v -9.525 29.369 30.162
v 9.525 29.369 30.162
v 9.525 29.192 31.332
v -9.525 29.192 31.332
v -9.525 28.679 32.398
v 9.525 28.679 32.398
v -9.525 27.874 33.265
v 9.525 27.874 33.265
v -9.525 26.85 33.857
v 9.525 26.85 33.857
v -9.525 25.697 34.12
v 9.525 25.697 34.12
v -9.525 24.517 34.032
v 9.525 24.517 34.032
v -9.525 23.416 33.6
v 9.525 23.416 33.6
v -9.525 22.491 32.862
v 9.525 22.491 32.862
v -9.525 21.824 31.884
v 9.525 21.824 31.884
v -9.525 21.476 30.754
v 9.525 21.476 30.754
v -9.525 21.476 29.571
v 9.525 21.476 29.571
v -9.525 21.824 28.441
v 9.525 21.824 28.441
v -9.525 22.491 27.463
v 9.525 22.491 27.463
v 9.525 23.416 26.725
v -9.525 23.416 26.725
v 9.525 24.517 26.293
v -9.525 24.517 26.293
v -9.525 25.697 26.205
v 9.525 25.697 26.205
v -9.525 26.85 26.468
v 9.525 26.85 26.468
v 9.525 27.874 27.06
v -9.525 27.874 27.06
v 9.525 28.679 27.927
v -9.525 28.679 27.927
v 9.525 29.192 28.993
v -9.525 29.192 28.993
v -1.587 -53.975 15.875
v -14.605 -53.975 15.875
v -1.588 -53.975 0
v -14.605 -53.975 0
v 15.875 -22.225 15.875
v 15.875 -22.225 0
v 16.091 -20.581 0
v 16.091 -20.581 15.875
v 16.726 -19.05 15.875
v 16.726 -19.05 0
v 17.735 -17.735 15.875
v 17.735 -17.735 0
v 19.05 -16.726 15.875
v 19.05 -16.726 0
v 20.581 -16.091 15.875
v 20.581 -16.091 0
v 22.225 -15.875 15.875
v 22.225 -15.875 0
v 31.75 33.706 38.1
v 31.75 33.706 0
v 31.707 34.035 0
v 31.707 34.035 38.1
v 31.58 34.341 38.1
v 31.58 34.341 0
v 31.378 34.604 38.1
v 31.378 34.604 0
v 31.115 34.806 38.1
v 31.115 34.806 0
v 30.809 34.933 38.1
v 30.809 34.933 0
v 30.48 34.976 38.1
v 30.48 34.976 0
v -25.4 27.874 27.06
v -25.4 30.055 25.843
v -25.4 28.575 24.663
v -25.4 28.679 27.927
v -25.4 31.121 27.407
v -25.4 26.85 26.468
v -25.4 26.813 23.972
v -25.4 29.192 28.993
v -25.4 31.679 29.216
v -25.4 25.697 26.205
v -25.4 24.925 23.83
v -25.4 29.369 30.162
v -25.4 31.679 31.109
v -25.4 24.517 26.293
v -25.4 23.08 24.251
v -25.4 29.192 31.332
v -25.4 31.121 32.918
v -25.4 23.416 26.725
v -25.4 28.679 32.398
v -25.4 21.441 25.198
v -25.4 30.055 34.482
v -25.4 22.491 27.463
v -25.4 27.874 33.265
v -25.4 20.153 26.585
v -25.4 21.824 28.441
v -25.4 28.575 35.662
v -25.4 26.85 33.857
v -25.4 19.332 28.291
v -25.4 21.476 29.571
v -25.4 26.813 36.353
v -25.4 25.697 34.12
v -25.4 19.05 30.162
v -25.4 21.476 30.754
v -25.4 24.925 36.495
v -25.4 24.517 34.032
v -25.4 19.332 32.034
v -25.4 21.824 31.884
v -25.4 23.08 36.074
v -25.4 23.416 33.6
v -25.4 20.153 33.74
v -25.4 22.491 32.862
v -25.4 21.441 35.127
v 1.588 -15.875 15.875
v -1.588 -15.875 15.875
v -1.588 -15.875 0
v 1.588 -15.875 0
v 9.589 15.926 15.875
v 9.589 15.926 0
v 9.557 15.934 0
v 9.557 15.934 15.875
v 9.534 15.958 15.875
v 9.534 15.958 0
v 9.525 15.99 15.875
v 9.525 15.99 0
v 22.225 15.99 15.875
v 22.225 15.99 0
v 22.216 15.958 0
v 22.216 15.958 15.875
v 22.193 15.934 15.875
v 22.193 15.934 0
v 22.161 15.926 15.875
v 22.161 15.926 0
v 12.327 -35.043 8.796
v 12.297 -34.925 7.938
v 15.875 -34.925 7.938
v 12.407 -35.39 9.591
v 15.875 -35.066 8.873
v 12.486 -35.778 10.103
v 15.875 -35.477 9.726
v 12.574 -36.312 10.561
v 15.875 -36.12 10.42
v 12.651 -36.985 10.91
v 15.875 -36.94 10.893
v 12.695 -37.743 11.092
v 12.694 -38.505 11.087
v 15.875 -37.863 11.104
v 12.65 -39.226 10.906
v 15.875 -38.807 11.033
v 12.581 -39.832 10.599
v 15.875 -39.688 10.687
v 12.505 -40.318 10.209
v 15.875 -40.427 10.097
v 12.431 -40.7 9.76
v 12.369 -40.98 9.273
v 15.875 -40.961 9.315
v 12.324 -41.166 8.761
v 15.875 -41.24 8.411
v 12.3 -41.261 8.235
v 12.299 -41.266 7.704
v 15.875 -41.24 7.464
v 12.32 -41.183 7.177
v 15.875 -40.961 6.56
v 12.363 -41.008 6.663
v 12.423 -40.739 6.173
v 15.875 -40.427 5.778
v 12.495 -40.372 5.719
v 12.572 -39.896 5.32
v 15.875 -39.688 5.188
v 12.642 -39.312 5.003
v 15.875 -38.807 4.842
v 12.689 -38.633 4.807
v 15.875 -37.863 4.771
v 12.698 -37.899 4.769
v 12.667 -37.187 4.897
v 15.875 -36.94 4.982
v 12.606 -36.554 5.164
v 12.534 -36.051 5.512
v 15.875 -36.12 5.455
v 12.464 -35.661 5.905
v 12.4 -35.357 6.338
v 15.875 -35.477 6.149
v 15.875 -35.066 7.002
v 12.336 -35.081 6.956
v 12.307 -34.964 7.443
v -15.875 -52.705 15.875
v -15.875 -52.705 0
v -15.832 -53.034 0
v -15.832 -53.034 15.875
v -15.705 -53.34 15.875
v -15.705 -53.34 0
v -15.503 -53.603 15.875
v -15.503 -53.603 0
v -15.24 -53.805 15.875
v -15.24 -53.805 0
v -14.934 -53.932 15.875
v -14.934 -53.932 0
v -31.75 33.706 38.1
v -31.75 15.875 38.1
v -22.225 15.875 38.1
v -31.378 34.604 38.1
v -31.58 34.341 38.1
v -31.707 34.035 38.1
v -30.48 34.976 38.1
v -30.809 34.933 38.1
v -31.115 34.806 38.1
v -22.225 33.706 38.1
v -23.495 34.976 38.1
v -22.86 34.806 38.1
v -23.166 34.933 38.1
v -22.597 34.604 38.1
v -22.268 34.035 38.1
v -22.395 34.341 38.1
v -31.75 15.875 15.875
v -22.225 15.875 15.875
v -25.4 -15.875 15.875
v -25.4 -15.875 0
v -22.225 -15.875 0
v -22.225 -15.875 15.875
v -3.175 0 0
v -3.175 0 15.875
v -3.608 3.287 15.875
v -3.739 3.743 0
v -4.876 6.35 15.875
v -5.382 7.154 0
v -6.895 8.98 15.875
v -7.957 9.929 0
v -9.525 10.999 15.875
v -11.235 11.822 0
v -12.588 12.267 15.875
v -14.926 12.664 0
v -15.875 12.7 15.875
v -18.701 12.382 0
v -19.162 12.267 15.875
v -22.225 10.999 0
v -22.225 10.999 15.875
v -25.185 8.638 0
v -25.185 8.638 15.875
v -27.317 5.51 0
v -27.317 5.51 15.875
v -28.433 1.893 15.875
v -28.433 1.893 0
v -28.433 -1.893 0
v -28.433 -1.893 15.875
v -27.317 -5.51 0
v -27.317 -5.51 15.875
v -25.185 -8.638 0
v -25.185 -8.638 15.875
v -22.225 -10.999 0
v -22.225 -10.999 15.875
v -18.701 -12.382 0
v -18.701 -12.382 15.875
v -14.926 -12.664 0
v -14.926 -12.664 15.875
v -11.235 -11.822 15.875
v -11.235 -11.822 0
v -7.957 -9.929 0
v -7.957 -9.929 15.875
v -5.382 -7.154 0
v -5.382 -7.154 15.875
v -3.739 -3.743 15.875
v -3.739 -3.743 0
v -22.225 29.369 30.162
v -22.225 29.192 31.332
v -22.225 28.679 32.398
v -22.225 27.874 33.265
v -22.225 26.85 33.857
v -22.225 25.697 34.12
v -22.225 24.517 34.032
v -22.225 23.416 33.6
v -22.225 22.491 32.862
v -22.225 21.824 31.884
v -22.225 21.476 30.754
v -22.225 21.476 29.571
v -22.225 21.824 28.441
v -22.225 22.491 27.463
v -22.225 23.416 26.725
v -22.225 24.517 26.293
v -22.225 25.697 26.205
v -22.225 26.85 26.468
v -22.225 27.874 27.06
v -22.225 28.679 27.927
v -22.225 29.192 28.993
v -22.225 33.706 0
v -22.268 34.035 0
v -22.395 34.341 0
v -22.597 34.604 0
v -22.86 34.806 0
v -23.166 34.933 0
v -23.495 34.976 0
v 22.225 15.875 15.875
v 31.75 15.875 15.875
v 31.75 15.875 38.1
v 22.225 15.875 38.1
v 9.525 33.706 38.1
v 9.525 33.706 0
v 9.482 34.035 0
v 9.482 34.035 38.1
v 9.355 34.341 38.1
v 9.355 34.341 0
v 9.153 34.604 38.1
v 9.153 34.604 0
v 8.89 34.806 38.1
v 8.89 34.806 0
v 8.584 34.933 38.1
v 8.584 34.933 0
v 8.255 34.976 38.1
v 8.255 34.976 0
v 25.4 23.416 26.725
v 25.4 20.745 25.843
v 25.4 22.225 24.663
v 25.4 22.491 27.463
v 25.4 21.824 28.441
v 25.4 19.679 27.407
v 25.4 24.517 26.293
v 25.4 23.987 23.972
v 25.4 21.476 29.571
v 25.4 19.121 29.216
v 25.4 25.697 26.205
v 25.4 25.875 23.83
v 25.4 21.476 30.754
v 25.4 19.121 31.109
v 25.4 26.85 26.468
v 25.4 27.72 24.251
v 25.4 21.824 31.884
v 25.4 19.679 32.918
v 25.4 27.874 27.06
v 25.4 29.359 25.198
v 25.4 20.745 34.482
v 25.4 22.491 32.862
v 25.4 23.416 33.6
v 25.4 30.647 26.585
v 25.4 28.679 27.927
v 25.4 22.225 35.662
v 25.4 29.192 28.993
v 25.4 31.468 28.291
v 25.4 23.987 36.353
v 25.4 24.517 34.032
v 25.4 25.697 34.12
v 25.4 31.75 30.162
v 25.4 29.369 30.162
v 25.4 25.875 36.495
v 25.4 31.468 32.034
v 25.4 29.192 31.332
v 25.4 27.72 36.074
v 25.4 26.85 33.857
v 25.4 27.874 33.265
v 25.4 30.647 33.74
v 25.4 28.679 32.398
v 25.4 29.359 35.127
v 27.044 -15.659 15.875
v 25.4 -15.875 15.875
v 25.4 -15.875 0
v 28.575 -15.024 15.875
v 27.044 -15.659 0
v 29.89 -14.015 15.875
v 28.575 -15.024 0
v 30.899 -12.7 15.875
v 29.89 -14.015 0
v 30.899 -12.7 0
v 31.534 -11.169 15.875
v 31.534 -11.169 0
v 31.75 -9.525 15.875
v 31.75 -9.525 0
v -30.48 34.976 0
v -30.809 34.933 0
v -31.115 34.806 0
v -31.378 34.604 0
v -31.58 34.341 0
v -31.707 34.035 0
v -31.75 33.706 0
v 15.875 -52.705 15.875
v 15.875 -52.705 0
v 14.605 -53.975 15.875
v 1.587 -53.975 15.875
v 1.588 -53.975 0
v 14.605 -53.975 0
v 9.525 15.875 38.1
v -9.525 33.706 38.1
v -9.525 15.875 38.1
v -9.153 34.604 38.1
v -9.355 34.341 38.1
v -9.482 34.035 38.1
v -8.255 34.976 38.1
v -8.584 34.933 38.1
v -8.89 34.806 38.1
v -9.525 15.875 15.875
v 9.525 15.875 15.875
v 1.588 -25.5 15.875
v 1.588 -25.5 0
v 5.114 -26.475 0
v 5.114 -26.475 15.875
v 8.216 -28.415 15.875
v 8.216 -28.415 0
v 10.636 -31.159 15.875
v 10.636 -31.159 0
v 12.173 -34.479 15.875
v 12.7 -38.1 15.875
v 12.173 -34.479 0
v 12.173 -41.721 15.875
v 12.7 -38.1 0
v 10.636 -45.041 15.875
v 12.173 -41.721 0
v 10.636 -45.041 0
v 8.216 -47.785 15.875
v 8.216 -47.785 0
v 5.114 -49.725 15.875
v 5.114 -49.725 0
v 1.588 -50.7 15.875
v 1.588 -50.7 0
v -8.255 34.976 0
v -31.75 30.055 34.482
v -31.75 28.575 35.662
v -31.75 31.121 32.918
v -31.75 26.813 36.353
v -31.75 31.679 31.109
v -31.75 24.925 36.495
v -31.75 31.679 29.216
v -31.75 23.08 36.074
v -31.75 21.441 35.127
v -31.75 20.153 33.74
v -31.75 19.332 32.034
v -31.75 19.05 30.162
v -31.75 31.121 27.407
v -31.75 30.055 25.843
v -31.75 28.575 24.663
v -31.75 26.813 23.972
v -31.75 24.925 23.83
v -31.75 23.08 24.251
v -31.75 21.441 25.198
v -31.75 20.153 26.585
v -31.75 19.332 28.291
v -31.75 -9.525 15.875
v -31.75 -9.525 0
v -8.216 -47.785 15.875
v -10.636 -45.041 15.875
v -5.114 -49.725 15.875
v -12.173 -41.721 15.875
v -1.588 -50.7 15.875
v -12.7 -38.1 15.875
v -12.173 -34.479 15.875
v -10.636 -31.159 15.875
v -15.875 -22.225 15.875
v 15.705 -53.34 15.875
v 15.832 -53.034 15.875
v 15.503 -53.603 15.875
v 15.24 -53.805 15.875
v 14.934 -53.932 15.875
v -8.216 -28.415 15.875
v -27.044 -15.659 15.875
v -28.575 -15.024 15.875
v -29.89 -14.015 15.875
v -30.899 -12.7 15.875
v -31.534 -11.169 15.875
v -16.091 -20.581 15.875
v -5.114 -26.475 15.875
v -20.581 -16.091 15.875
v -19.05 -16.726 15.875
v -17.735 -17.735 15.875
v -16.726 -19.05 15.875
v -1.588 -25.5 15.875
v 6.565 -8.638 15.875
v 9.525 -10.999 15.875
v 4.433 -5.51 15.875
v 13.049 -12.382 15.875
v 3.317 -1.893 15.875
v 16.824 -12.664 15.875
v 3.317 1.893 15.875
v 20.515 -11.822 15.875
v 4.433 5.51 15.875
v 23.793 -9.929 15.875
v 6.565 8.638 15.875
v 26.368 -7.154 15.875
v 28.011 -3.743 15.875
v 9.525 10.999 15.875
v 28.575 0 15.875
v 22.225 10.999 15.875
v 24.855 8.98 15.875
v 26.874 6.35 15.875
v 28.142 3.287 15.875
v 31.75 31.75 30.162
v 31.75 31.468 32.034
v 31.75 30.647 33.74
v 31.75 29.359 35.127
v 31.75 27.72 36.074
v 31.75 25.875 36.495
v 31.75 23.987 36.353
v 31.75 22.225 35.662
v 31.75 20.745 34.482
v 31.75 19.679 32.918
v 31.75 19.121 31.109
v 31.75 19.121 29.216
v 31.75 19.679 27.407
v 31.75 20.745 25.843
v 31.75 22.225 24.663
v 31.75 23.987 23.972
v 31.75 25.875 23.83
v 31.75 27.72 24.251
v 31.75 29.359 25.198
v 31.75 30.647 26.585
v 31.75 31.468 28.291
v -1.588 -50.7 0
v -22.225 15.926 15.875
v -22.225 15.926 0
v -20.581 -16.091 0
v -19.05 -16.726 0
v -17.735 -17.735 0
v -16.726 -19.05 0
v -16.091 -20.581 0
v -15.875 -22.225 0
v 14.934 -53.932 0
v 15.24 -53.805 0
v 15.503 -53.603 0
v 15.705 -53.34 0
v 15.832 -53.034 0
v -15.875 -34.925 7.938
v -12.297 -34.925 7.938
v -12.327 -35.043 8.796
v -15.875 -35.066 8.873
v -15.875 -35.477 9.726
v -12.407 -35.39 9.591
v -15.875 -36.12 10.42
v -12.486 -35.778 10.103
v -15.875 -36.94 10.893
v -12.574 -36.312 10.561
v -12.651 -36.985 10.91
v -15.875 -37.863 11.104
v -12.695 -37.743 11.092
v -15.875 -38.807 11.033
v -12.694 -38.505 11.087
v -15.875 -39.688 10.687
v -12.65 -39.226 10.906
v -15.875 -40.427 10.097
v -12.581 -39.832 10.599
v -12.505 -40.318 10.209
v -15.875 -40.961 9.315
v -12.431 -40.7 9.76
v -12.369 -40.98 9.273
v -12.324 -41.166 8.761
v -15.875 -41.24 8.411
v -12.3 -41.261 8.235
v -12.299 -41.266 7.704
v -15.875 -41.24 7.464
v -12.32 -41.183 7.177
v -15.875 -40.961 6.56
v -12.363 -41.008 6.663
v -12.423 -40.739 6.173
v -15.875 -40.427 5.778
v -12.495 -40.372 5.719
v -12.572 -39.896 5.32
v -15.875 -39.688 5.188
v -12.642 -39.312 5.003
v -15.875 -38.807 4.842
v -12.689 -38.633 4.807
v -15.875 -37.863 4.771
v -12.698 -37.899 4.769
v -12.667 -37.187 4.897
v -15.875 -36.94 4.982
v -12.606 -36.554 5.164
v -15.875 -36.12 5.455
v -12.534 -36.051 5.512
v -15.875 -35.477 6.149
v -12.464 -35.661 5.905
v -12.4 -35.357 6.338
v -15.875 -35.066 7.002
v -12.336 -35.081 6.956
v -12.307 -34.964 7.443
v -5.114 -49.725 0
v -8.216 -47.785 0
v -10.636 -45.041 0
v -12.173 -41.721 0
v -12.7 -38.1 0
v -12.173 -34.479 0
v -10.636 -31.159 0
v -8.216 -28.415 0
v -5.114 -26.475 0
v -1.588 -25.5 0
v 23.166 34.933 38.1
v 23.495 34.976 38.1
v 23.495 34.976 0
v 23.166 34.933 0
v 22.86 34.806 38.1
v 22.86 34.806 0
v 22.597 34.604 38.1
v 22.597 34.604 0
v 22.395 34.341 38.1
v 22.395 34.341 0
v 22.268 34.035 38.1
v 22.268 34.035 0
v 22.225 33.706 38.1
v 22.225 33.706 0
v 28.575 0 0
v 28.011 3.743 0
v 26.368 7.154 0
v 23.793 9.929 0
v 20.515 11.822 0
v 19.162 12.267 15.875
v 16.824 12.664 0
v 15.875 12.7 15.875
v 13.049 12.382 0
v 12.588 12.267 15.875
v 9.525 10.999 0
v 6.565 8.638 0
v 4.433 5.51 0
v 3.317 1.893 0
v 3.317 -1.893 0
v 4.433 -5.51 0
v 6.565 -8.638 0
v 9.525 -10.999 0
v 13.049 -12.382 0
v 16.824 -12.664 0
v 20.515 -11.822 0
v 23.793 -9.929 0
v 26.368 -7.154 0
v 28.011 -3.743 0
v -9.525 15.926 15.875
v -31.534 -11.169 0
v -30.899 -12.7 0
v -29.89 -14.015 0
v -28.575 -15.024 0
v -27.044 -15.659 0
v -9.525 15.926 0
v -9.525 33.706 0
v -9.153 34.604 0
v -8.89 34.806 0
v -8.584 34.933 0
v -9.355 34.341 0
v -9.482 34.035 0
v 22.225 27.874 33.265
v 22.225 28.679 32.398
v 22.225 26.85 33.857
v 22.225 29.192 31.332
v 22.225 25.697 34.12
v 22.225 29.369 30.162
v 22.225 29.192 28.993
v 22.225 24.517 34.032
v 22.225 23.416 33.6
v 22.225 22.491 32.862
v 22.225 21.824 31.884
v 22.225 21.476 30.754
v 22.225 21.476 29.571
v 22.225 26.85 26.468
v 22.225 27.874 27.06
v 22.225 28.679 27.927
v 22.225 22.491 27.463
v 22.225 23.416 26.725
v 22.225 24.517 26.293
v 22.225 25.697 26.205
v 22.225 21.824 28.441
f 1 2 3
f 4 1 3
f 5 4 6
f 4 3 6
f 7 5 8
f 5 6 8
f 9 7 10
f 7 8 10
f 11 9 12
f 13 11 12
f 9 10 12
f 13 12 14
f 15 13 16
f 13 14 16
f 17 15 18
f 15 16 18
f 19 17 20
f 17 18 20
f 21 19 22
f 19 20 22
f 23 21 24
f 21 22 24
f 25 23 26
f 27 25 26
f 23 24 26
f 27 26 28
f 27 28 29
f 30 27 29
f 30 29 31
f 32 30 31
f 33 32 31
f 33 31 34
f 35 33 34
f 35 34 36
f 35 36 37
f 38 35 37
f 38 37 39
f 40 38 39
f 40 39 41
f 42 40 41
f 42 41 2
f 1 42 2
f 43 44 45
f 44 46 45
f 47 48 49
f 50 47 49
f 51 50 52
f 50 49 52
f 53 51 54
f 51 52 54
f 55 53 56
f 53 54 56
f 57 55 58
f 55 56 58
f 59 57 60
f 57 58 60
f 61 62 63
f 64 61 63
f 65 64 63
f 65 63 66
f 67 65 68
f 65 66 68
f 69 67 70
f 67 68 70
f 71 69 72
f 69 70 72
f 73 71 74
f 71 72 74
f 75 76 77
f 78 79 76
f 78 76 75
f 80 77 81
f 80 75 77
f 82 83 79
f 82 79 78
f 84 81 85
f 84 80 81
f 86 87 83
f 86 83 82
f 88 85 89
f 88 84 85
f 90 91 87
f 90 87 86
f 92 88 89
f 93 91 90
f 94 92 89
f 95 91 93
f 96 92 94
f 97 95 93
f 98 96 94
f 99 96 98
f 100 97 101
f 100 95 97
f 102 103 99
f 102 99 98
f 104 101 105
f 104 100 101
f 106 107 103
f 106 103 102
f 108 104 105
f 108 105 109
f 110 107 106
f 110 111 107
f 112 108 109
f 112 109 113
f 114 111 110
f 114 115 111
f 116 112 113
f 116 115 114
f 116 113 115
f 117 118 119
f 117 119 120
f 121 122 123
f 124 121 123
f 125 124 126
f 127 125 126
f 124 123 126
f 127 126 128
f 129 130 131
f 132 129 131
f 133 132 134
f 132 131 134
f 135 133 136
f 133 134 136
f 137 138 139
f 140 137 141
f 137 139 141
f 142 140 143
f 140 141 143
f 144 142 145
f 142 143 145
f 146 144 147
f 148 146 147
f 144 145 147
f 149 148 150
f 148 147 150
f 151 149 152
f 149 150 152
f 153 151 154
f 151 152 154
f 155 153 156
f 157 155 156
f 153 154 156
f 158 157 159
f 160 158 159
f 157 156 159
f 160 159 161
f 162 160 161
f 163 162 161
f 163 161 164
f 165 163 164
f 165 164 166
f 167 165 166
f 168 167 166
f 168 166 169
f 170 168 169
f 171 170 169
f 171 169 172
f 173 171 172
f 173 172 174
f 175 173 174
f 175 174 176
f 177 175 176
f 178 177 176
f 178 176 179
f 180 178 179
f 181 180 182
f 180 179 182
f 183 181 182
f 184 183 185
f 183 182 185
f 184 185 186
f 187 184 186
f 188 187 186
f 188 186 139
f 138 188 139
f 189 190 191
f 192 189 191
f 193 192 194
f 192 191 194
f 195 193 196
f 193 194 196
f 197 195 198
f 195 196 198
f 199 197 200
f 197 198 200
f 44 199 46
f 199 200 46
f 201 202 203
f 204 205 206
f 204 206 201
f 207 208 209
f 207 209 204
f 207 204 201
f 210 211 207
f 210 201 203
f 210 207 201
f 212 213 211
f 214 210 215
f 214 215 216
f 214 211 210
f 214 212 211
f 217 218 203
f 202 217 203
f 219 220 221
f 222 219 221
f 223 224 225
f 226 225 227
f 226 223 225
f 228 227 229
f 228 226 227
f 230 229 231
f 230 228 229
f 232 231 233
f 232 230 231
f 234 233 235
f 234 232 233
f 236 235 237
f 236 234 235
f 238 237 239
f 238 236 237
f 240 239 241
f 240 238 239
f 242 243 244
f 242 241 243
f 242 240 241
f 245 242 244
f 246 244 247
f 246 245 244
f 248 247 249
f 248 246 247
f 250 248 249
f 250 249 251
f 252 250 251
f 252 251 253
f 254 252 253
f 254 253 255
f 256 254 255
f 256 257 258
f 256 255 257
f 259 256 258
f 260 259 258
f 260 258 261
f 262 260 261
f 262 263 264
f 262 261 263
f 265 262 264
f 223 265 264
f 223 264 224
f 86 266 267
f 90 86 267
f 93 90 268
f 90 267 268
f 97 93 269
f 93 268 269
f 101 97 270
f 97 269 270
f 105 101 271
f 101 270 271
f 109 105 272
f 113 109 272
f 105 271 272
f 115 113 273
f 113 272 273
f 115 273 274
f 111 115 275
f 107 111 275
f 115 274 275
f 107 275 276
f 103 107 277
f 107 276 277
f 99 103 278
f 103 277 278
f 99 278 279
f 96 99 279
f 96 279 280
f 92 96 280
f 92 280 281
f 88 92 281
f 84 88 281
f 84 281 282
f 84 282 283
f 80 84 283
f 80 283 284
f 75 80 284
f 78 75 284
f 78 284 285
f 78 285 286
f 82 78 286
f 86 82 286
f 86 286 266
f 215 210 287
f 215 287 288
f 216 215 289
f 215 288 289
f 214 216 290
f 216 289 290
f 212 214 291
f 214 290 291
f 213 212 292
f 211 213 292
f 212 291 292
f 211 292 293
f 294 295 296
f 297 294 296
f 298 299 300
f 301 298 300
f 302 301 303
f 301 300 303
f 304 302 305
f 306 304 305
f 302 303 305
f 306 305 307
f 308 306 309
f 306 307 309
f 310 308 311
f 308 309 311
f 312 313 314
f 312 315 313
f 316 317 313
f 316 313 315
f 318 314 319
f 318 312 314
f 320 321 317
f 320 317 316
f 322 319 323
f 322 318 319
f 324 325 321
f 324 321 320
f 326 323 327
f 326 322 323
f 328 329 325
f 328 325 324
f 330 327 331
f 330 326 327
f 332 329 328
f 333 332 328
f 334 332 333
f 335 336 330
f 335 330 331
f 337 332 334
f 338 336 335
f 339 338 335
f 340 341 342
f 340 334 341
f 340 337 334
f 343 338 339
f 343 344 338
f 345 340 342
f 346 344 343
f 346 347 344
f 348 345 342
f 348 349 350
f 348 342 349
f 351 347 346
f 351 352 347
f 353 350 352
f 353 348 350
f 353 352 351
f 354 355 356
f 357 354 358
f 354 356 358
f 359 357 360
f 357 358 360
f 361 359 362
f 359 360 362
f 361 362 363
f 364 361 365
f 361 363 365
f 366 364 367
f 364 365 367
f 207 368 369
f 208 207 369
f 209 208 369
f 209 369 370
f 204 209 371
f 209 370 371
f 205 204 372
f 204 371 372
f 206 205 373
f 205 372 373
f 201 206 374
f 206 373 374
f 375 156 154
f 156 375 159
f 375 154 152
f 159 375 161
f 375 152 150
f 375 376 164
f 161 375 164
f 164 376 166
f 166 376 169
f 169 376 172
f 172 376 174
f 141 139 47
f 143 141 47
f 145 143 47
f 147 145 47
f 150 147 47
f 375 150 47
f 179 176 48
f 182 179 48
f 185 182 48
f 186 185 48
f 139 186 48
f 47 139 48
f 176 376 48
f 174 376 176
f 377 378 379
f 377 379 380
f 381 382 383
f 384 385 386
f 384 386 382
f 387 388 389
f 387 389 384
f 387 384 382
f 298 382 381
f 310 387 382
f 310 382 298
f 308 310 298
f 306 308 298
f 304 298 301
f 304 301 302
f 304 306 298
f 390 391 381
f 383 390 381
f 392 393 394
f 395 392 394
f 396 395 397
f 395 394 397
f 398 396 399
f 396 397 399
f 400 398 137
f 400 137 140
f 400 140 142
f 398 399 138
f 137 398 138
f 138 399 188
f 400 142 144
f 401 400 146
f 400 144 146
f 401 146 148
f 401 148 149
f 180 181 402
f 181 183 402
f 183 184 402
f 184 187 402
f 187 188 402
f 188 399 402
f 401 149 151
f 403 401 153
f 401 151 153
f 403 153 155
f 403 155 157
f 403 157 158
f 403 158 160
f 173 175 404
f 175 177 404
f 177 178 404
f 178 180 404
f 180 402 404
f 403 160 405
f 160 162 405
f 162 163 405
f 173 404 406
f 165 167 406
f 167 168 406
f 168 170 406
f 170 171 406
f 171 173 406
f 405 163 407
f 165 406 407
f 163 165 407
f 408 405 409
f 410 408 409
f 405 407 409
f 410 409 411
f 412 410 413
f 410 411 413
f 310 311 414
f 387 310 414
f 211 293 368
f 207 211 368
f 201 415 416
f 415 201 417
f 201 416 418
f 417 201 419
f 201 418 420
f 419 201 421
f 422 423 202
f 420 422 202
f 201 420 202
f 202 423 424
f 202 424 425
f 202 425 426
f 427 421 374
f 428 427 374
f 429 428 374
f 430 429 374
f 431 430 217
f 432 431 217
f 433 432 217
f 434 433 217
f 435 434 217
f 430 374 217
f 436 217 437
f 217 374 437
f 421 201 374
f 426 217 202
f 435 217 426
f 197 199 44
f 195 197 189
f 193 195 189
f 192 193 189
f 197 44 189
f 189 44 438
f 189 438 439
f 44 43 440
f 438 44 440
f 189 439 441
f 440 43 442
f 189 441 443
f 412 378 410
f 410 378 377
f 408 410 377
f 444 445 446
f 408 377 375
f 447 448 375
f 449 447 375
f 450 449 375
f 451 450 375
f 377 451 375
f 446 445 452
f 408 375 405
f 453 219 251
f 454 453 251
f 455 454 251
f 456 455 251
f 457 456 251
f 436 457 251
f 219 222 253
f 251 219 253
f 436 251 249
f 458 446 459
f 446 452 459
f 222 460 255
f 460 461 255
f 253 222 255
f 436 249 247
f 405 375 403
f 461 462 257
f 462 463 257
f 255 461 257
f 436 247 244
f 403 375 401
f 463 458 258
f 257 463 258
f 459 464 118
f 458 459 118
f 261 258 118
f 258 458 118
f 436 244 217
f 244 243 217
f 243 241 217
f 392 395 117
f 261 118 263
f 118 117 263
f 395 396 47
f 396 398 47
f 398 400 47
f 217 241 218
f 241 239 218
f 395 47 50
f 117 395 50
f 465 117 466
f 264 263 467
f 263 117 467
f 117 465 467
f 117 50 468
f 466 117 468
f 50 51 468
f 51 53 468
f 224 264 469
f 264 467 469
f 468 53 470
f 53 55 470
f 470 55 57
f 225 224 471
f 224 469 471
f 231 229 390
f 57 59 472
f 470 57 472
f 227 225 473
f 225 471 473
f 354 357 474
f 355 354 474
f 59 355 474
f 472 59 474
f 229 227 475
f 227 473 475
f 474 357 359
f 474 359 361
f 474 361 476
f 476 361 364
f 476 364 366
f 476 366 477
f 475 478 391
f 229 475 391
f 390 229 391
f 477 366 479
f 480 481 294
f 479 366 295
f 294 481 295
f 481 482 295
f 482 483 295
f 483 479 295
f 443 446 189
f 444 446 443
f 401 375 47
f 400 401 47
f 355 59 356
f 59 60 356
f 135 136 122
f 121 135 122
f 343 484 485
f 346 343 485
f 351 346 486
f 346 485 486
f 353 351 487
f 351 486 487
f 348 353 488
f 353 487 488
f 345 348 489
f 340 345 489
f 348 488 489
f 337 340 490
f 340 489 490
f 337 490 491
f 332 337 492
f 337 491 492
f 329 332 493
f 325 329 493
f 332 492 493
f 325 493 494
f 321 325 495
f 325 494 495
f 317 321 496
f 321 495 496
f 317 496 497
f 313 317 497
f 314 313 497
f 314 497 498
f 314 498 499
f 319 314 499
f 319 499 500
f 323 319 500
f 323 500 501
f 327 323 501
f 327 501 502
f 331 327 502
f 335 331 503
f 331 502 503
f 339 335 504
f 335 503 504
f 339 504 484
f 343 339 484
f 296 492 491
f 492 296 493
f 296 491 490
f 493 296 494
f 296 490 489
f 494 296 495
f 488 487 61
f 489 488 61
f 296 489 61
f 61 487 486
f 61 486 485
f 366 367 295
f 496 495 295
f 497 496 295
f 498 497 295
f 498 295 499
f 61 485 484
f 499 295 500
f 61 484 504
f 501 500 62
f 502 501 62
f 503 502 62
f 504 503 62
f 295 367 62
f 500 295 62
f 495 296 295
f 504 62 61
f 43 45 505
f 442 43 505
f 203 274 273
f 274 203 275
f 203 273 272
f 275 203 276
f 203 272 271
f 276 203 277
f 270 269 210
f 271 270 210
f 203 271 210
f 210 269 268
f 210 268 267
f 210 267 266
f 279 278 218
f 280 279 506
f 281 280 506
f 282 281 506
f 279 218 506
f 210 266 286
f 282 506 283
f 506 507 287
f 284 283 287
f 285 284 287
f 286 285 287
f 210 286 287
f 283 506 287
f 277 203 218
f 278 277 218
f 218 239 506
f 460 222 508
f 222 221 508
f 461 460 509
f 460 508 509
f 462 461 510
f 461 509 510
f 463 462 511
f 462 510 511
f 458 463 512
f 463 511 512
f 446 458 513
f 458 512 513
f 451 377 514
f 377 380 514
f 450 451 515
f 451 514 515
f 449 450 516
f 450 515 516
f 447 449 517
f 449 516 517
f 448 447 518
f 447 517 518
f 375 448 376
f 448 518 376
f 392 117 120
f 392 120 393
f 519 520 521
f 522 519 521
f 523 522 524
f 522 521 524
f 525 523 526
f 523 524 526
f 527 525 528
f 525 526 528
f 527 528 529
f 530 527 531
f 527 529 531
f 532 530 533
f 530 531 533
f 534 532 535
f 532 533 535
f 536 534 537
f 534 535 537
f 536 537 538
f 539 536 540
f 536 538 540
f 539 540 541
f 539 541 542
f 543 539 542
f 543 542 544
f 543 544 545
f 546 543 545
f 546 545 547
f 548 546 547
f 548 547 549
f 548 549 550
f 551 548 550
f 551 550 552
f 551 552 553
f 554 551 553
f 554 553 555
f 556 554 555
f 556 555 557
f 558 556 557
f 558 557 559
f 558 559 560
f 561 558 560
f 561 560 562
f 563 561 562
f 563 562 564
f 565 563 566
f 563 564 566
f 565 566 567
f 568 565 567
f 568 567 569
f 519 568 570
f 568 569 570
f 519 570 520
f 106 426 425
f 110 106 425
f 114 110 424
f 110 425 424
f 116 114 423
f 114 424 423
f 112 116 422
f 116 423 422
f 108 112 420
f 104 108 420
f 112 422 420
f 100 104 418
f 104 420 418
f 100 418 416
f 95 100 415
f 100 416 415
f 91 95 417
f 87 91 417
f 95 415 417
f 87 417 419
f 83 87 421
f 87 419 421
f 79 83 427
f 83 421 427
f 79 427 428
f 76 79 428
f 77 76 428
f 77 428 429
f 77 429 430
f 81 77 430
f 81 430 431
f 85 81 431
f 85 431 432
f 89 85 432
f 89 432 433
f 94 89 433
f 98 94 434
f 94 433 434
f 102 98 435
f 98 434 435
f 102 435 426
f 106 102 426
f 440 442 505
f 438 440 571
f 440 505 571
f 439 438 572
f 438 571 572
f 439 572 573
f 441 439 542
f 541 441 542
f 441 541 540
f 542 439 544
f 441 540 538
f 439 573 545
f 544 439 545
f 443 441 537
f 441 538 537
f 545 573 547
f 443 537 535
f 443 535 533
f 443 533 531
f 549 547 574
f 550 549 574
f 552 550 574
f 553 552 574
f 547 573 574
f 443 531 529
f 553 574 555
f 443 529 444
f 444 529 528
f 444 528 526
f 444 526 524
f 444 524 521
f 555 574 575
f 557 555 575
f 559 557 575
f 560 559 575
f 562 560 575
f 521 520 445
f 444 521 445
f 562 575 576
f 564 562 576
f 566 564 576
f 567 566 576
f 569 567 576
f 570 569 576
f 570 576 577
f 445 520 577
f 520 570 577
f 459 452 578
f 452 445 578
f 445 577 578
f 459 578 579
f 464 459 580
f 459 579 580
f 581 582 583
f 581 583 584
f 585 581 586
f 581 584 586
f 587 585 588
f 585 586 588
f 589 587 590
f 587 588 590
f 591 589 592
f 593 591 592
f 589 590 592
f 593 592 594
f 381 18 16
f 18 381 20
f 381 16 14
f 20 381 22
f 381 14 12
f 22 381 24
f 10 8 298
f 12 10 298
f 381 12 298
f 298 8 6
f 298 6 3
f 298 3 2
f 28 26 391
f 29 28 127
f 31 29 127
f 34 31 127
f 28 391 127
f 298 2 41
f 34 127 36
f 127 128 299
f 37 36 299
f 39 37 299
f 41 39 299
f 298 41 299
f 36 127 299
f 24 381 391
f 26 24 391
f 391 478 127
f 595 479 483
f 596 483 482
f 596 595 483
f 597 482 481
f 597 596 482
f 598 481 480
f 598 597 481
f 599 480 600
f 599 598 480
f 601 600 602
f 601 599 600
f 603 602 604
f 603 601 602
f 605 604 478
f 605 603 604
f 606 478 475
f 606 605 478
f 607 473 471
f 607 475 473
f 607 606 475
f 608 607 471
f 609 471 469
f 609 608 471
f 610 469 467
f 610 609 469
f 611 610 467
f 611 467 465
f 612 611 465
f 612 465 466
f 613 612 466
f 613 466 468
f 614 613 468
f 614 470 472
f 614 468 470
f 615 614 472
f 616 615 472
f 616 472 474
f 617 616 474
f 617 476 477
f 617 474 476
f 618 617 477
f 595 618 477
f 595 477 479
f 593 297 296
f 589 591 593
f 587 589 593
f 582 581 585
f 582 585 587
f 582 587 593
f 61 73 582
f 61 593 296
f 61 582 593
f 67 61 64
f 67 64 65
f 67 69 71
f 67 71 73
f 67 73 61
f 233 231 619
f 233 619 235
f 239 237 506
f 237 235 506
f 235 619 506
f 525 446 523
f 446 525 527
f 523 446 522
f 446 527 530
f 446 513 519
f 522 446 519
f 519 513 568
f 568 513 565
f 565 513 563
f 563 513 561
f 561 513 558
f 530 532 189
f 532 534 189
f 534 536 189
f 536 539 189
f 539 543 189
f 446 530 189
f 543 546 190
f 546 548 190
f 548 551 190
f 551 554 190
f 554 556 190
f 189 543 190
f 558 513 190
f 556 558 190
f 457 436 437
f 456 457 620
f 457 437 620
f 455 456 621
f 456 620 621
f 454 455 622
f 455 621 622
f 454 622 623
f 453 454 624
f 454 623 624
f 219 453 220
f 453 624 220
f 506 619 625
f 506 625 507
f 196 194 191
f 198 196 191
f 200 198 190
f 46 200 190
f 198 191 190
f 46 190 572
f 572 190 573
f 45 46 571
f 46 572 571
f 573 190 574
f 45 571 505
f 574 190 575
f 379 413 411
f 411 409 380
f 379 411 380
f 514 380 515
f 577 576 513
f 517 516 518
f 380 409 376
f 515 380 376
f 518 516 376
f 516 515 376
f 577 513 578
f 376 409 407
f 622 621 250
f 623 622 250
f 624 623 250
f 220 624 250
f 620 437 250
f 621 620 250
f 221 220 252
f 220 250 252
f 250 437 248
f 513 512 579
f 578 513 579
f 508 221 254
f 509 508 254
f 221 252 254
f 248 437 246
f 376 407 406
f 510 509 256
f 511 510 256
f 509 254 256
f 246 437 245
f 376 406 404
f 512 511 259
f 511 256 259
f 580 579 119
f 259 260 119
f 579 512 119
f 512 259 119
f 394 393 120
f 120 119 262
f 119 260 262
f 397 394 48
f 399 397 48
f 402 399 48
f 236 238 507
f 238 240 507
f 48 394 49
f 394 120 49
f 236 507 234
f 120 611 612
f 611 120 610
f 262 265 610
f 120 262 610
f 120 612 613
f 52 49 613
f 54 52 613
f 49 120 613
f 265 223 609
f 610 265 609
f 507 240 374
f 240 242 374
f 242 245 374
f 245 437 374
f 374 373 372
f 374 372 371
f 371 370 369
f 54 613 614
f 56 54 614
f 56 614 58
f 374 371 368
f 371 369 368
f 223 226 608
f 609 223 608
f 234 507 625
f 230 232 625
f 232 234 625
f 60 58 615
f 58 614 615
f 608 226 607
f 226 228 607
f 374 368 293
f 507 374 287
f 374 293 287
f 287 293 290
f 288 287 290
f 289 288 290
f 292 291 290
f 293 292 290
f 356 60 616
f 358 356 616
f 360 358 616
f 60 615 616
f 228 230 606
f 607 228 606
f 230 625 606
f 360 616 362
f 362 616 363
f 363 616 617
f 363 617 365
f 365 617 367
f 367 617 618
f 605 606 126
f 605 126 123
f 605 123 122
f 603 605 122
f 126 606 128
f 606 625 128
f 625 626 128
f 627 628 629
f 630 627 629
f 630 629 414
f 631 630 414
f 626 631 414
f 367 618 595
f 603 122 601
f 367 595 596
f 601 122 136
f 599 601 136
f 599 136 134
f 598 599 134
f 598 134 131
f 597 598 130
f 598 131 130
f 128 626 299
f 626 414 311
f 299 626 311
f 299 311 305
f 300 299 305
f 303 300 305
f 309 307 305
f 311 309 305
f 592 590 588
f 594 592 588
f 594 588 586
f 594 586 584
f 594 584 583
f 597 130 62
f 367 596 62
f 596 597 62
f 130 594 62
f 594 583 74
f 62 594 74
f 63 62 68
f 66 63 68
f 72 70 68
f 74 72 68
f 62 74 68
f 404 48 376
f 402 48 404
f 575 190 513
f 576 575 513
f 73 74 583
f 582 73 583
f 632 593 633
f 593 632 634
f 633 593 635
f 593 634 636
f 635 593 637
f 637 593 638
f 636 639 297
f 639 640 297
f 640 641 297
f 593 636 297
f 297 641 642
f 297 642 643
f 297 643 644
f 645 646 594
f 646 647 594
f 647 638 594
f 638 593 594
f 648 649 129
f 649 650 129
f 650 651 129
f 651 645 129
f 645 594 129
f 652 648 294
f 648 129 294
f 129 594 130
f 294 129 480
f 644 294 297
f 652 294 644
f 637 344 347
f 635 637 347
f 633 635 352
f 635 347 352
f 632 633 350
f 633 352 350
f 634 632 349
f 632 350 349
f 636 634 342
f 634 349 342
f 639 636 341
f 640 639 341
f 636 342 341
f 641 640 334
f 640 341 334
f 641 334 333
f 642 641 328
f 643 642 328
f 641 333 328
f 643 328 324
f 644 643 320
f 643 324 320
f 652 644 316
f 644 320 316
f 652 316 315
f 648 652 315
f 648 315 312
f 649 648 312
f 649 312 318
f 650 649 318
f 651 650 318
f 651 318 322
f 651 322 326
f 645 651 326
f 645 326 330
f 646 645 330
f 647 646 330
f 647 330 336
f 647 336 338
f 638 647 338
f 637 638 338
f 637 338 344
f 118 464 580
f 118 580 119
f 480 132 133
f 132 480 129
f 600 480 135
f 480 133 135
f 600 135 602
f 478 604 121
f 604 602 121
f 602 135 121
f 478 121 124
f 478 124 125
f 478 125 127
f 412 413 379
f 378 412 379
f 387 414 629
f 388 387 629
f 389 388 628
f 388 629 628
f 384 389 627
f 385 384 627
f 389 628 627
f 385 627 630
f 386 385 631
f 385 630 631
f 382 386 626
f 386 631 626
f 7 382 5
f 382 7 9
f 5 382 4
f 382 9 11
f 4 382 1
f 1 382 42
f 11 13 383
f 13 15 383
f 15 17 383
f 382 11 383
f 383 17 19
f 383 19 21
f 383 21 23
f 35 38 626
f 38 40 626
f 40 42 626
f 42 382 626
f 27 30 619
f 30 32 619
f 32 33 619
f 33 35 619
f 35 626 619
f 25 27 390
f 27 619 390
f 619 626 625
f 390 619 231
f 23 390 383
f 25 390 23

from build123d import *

# Parameters (mm, degrees)
F0_R      = 12.7
F1_DEPTH  = 38.1
F2_W      = 69.85
F2_H      = 22.225
F3_DEPTH  = 63.501
F4_W      = 12.7
F4_H      = 29.490311
F5_DEPTH  = 88.951801
F6_R      = 3.96875
F6_R_2    = 3.175
F7_DEPTH  = 63.501
F8_R      = 6.35
F9_DEPTH  = 6.35
F10_R     = 6.35
F11_DEPTH = 6.35


with BuildPart() as f1:
    # F0 (on Top) → F1 (new body)
    with BuildSketch(Plane.XY):
        with BuildLine():
            ThreePointArc((-1.5875, -50.700391), (-12.7, -38.1), (-1.5875, -25.499609))
            Line((-1.5875, -25.499609), (-1.5875, -15.875))
            Line((-1.5875, -15.875), (1.5875, -15.875))
            Line((1.5875, -15.875), (1.5875, -25.499609))
            ThreePointArc((1.5875, -25.499609), (12.7, -38.1), (1.5875, -50.700391))
            Line((1.5875, -50.700391), (1.5875, -53.975))
            Line((1.5875, -53.975), (14.605, -53.975))
            ThreePointArc((14.605, -53.975), (15.503026, -53.603026), (15.875, -52.705))
            Line((15.875, -52.705), (15.875, -22.225))
            ThreePointArc((15.875, -22.225), (17.734872, -17.734872), (22.225, -15.875))
            Line((22.225, -15.875), (25.4, -15.875))
            ThreePointArc((25.4, -15.875), (29.890128, -14.015128), (31.75, -9.525))
            Line((31.75, -9.525), (31.75, 33.705801))
            ThreePointArc((31.75, 33.705801), (31.378026, 34.603826), (30.48, 34.975801))
            Line((30.48, 34.975801), (23.495, 34.975801))
            ThreePointArc((23.495, 34.975801), (22.596974, 34.603826), (22.225, 33.705801))
            Line((22.225, 33.705801), (22.225, 15.98998))
            ThreePointArc((22.225, 15.98998), (22.206202, 15.944598), (22.160821, 15.925801))
            Line((22.160821, 15.925801), (9.589179, 15.925801))
            ThreePointArc((9.589179, 15.925801), (9.543798, 15.944598), (9.525, 15.98998))
            Line((9.525, 15.98998), (9.525, 33.705801))
            ThreePointArc((9.525, 33.705801), (9.153026, 34.603826), (8.255, 34.975801))
            Line((8.255, 34.975801), (-8.255, 34.975801))
            ThreePointArc((-8.255, 34.975801), (-9.153026, 34.603826), (-9.525, 33.705801))
            Line((-9.525, 33.705801), (-9.525, 15.925801))
            Line((-9.525, 15.925801), (-22.225, 15.925801))
            Line((-22.225, 15.925801), (-22.225, 33.705801))
            ThreePointArc((-22.225, 33.705801), (-22.596974, 34.603826), (-23.495, 34.975801))
            Line((-23.495, 34.975801), (-30.48, 34.975801))
            ThreePointArc((-30.48, 34.975801), (-31.378026, 34.603826), (-31.75, 33.705801))
            Line((-31.75, 33.705801), (-31.75, -9.525))
            ThreePointArc((-31.75, -9.525), (-29.890128, -14.015128), (-25.4, -15.875))
            Line((-25.4, -15.875), (-22.225, -15.875))
            ThreePointArc((-22.225, -15.875), (-17.734872, -17.734872), (-15.875, -22.225))
            Line((-15.875, -22.225), (-15.875, -52.705))
            ThreePointArc((-15.875, -52.705), (-15.503026, -53.603026), (-14.605, -53.975))
            Line((-14.605, -53.975), (-1.5875, -53.975))
            Line((-1.5875, -53.975), (-1.5875, -50.700391))
        make_face()
        with Locations((-15.875, 0)):
            Circle(F0_R, mode=Mode.SUBTRACT)
        with Locations((15.875, 0)):
            Circle(F0_R, mode=Mode.SUBTRACT)
    extrude(amount=F1_DEPTH)

    # F2 (on face) → F3 (cut, through all)
    with BuildSketch(Plane.YZ.offset(31.75)):
        with Locations((-19.05, 26.9875)):
            Rectangle(F2_W, F2_H)
    extrude(amount=-F3_DEPTH, mode=Mode.SUBTRACT)

    # F4 (on face) → F5 (cut, through all)
    with BuildSketch(Plane(origin=(0, 34.975801, 0), x_dir=(-1, 0, 0), z_dir=(0, 1, 0))):
        with Locations((15.875, 30.620155)):
            Rectangle(F4_W, F4_H)
        with Locations((-15.875, 30.620155)):
            Rectangle(F4_W, F4_H)
    extrude(amount=-F5_DEPTH, mode=Mode.SUBTRACT)

    # F6 (on face) → F7 (cut, through all)
    with BuildSketch(Plane.YZ.offset(31.75)):
        with Locations((25.4, 30.1625)):
            Circle(F6_R)
        with Locations((-38.1, 7.9375)):
            Circle(F6_R_2)
    extrude(amount=-F7_DEPTH, mode=Mode.SUBTRACT)

    # F8 (on face) → F9 (cut)
    with BuildSketch(Plane.YZ.offset(31.75)):
        with Locations((25.4, 30.1625)):
            Circle(F8_R)
    extrude(amount=-F9_DEPTH, mode=Mode.SUBTRACT)

    # F10 (on face) → F11 (cut)
    with BuildSketch(Plane(origin=(-31.75, 0, 0), x_dir=(0, -1, 0), z_dir=(-1, 0, 0))):
        with Locations((-25.4, 30.1625)):
            Circle(F10_R)
    extrude(amount=-F11_DEPTH, mode=Mode.SUBTRACT)


solid = f1.part
